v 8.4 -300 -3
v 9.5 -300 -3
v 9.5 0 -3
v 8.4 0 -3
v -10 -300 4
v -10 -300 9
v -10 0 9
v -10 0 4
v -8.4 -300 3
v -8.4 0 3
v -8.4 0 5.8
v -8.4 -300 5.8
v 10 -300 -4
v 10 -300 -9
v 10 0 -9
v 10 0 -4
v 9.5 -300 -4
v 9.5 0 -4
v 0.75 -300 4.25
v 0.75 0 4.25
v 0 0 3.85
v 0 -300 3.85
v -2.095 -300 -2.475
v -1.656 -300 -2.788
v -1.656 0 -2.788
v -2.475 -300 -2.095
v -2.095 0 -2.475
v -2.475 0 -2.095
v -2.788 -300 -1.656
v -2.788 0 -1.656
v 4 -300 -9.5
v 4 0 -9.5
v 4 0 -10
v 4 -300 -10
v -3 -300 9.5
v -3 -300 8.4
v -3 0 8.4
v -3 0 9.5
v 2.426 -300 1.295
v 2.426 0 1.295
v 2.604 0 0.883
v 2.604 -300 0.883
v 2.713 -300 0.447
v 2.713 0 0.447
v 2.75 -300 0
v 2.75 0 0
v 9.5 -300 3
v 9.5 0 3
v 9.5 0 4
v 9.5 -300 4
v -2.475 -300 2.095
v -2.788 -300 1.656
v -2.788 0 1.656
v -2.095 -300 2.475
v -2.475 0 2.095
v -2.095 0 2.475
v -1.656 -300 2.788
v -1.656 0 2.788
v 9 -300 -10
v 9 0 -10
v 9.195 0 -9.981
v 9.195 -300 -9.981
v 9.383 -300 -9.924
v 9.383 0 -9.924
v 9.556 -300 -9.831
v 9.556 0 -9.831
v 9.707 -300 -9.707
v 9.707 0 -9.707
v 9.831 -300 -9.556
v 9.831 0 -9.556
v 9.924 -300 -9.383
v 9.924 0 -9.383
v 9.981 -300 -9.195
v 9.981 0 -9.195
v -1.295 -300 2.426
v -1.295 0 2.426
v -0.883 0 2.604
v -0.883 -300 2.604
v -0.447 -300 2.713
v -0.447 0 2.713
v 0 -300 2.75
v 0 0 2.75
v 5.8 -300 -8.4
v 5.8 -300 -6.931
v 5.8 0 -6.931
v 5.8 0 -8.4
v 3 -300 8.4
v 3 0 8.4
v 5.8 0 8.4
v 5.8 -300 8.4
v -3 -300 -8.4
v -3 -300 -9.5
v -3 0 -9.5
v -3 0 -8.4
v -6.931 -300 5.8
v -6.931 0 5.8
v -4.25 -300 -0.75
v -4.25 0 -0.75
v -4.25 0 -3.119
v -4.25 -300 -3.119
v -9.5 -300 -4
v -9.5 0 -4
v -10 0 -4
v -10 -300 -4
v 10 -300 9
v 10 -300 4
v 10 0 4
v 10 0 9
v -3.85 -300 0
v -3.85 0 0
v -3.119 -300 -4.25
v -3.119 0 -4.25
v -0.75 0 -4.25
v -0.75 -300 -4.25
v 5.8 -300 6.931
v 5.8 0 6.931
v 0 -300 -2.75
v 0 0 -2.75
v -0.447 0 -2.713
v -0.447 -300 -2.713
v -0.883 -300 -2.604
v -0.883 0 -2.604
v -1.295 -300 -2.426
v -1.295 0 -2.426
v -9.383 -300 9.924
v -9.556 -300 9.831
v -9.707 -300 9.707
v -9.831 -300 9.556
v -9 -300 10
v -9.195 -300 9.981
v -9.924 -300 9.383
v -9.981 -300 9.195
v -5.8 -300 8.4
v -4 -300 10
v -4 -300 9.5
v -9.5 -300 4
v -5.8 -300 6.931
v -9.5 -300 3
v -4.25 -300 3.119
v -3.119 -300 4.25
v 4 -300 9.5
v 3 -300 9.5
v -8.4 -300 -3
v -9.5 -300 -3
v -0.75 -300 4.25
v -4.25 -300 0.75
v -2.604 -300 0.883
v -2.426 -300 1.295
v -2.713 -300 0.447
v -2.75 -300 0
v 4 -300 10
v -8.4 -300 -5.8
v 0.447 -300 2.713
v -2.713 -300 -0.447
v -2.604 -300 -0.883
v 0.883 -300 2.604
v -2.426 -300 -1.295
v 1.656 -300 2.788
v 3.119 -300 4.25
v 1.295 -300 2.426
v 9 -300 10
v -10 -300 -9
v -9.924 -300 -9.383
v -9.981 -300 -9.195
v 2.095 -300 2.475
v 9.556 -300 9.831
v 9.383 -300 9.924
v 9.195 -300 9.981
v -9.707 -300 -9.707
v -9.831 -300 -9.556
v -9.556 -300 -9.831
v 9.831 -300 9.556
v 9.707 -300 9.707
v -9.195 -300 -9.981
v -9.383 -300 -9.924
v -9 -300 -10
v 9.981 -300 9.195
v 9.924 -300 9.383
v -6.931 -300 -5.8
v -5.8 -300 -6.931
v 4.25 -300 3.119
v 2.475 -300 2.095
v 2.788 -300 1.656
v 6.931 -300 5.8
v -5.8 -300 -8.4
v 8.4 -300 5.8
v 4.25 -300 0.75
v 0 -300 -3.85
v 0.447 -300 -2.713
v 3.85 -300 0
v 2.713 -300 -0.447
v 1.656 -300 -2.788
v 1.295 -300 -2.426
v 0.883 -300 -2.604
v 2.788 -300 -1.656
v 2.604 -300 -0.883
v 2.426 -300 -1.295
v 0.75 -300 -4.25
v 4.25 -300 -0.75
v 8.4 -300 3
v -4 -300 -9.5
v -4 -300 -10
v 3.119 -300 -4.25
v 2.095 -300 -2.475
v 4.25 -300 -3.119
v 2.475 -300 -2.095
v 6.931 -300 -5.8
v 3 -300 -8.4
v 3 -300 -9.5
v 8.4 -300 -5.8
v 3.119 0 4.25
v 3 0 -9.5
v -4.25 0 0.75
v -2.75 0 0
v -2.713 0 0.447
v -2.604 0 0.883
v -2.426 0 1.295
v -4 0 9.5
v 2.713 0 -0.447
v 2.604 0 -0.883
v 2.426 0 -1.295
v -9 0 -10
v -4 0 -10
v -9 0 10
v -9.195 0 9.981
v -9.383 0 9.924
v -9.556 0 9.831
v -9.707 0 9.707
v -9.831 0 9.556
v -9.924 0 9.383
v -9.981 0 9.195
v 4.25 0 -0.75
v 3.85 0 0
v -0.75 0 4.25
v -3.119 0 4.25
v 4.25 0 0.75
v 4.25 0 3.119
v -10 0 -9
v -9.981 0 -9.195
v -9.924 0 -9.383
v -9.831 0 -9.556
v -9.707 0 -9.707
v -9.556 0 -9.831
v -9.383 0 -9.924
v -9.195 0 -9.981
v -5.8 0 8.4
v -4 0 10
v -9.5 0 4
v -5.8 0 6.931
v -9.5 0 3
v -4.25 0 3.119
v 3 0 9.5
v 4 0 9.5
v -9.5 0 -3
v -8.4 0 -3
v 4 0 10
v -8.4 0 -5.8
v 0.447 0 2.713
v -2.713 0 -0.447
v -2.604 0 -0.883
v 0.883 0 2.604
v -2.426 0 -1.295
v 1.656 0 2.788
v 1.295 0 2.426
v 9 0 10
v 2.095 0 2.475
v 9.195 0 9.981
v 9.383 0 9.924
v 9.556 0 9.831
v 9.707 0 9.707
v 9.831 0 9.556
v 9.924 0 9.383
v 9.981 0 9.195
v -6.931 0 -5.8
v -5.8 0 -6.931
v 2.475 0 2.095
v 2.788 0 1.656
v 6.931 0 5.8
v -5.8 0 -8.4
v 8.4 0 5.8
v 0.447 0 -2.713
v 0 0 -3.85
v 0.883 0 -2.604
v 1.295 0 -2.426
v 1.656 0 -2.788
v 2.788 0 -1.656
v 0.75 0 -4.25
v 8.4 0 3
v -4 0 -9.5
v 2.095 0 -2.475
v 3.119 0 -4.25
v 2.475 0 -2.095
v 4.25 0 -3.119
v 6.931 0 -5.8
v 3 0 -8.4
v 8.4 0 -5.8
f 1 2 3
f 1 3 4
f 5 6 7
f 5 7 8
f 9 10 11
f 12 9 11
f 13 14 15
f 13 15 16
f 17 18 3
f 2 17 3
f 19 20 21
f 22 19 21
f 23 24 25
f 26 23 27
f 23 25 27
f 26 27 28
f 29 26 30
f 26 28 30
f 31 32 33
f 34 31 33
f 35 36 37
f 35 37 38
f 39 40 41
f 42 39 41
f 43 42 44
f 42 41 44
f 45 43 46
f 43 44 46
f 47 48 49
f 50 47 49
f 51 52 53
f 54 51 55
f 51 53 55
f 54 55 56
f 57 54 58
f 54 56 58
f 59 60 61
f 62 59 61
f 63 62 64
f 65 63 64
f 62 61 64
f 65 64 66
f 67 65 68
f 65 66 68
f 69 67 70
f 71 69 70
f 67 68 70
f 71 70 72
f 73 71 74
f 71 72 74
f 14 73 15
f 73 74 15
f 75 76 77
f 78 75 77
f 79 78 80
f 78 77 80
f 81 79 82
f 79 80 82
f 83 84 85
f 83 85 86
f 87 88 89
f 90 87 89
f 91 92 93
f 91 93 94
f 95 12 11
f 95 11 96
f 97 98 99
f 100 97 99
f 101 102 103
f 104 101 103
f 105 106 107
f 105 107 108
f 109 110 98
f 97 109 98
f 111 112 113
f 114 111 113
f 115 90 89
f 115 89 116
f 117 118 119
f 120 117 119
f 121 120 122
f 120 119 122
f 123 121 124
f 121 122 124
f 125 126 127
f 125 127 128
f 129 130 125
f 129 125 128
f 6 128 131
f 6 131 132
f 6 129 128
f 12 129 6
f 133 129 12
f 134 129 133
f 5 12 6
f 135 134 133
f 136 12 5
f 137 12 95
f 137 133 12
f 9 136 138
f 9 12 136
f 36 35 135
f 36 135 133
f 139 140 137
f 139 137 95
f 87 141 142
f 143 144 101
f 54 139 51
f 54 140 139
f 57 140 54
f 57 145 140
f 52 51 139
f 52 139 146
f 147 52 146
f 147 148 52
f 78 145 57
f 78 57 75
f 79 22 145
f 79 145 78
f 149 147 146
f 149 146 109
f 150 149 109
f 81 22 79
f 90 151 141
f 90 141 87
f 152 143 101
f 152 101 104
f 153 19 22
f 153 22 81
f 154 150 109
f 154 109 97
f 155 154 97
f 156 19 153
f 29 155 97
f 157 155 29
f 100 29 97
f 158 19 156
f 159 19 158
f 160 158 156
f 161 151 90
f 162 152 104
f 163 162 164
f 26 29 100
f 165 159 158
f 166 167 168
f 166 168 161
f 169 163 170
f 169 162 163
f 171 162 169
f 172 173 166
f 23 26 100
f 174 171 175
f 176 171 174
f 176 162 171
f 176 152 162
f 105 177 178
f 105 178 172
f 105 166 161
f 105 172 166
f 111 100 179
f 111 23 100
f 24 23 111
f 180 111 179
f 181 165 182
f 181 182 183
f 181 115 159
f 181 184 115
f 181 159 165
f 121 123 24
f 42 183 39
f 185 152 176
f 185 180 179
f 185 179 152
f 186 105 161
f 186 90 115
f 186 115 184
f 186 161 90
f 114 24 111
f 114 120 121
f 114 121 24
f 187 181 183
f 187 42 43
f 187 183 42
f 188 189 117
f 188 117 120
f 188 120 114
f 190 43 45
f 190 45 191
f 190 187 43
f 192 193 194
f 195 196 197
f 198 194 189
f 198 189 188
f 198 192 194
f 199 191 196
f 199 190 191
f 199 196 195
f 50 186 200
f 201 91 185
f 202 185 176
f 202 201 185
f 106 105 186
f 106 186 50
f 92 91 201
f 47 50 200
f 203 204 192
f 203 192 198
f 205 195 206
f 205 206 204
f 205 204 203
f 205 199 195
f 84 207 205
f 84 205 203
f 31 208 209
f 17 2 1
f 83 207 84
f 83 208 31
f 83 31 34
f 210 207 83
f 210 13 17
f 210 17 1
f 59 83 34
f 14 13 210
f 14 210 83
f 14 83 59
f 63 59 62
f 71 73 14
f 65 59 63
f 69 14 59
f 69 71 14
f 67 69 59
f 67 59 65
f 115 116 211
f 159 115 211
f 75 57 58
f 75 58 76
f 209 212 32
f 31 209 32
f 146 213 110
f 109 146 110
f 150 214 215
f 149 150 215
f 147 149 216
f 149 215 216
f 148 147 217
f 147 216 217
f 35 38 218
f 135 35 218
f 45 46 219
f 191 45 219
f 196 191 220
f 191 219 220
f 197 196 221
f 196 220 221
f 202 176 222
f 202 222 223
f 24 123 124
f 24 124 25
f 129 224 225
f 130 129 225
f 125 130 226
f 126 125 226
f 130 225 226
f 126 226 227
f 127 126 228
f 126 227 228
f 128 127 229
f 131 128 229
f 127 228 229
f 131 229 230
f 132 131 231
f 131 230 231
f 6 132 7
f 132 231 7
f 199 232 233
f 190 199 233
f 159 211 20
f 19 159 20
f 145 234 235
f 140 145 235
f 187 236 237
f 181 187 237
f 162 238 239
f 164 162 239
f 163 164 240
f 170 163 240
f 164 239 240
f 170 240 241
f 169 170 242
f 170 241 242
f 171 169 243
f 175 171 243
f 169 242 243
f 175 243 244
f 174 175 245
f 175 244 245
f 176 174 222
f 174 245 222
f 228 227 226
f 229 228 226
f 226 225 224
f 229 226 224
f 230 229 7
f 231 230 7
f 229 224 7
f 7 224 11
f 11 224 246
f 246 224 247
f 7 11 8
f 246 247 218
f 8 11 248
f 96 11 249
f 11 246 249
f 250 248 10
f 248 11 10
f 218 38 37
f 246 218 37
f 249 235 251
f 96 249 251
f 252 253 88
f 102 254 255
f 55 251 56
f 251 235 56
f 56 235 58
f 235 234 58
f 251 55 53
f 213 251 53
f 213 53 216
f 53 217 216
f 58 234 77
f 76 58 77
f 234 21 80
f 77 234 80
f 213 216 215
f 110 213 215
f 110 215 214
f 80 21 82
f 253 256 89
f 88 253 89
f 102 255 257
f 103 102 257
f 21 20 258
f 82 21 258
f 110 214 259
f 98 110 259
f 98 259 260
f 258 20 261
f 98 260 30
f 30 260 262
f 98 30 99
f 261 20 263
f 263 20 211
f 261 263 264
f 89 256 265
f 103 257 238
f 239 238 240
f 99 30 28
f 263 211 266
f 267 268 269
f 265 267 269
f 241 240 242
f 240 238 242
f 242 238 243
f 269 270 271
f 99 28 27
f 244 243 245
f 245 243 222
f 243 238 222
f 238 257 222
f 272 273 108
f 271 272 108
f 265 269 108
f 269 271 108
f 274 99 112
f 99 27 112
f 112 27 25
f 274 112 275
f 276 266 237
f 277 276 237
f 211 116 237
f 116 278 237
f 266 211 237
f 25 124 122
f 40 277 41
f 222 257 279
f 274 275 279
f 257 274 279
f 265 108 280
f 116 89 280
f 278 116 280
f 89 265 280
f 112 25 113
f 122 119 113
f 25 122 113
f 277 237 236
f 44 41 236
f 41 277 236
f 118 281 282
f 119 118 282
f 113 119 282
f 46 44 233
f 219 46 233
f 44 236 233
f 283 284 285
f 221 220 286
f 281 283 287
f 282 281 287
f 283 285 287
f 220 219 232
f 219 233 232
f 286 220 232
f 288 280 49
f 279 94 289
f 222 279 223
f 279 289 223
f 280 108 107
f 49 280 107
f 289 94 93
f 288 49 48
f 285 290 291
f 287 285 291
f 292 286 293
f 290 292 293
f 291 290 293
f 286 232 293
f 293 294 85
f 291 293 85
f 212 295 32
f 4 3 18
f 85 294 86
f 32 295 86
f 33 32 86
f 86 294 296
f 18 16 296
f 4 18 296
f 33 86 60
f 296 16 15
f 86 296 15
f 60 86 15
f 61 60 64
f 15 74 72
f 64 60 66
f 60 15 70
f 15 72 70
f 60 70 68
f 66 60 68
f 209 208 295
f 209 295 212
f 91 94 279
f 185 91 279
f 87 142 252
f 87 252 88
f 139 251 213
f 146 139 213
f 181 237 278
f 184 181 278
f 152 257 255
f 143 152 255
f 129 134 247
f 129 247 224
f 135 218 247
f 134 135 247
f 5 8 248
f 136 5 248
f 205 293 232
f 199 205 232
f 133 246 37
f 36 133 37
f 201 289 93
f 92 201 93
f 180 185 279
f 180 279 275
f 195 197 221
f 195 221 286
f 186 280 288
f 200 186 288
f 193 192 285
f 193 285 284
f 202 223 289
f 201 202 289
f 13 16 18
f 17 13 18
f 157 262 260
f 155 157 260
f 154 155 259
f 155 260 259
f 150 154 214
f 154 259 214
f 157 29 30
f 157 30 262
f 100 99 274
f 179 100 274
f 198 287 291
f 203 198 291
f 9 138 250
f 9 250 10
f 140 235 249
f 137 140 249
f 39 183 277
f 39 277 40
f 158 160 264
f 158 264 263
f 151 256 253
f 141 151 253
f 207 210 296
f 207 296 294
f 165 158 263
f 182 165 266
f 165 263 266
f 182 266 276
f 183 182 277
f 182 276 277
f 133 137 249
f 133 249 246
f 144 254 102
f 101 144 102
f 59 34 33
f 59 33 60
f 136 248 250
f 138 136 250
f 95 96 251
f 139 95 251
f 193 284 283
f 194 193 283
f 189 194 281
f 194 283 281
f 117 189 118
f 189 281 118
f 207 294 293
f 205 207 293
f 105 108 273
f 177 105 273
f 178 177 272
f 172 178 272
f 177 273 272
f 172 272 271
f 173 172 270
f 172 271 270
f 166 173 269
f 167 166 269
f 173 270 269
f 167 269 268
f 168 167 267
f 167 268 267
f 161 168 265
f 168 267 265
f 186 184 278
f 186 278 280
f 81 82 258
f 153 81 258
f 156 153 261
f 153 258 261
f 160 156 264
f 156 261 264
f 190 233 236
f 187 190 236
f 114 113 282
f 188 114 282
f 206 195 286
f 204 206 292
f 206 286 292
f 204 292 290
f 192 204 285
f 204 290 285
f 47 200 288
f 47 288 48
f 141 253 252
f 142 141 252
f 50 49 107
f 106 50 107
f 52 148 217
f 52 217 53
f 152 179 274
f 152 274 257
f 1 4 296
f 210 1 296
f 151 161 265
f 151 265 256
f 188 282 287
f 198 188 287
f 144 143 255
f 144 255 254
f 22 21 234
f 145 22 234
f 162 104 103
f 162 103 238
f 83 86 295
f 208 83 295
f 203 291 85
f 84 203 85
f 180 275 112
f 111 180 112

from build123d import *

# Parameters (mm, degrees)
F1_DEPTH = 300
F3_COUNT = 4


with BuildPart() as f1:
    # F0 (on Front) → F1 (new body)
    with BuildSketch(Plane.XZ):
        with BuildLine():
            ThreePointArc((-2.75, 0), (-2.667804, 0.667325), (-2.426129, 1.294758))
            Line((-2.426129, 1.294758), (-2.787674, 1.656303))
            ThreePointArc((-2.787674, 1.656303), (-2.292699, 2.292699), (-1.656303, 2.787674))
            Line((-1.656303, 2.787674), (-1.294758, 2.426129))
            ThreePointArc((-1.294758, 2.426129), (-0.667325, 2.667804), (0, 2.75))
            Line((0, 2.75), (0, 3.85))
            Line((0, 3.85), (-0.75, 4.25))
            Line((-0.75, 4.25), (-3.118629, 4.25))
            Line((-3.118629, 4.25), (-5.8, 6.931371))
            Line((-5.8, 6.931371), (-5.8, 8.4))
            Line((-5.8, 8.4), (-3, 8.4))
            Line((-3, 8.4), (-3, 9.5))
            Line((-3, 9.5), (-4, 9.5))
            Line((-4, 9.5), (-4, 10))
            Line((-4, 10), (-9, 10))
            ThreePointArc((-9, 10), (-9.707107, 9.707107), (-10, 9))
            Line((-10, 9), (-10, 4))
            Line((-10, 4), (-9.5, 4))
            Line((-9.5, 4), (-9.5, 3))
            Line((-9.5, 3), (-8.4, 3))
            Line((-8.4, 3), (-8.4, 5.8))
            Line((-8.4, 5.8), (-6.931371, 5.8))
            Line((-6.931371, 5.8), (-4.25, 3.118629))
            Line((-4.25, 3.118629), (-4.25, 0.75))
            Line((-4.25, 0.75), (-3.85, 0))
            Line((-3.85, 0), (-2.75, 0))
        make_face()
    extrude(amount=F1_DEPTH)

    # F3: F1 ×4 about axis
    f3_axis = Axis((0, -150, 0), (0, -1, 0))


with BuildPart() as f1_1:
    add(f1.part)
    for i in range(1, F3_COUNT):
        add(f1.part.rotate(f3_axis, i * 360 / F3_COUNT))


solid = f1_1.part
